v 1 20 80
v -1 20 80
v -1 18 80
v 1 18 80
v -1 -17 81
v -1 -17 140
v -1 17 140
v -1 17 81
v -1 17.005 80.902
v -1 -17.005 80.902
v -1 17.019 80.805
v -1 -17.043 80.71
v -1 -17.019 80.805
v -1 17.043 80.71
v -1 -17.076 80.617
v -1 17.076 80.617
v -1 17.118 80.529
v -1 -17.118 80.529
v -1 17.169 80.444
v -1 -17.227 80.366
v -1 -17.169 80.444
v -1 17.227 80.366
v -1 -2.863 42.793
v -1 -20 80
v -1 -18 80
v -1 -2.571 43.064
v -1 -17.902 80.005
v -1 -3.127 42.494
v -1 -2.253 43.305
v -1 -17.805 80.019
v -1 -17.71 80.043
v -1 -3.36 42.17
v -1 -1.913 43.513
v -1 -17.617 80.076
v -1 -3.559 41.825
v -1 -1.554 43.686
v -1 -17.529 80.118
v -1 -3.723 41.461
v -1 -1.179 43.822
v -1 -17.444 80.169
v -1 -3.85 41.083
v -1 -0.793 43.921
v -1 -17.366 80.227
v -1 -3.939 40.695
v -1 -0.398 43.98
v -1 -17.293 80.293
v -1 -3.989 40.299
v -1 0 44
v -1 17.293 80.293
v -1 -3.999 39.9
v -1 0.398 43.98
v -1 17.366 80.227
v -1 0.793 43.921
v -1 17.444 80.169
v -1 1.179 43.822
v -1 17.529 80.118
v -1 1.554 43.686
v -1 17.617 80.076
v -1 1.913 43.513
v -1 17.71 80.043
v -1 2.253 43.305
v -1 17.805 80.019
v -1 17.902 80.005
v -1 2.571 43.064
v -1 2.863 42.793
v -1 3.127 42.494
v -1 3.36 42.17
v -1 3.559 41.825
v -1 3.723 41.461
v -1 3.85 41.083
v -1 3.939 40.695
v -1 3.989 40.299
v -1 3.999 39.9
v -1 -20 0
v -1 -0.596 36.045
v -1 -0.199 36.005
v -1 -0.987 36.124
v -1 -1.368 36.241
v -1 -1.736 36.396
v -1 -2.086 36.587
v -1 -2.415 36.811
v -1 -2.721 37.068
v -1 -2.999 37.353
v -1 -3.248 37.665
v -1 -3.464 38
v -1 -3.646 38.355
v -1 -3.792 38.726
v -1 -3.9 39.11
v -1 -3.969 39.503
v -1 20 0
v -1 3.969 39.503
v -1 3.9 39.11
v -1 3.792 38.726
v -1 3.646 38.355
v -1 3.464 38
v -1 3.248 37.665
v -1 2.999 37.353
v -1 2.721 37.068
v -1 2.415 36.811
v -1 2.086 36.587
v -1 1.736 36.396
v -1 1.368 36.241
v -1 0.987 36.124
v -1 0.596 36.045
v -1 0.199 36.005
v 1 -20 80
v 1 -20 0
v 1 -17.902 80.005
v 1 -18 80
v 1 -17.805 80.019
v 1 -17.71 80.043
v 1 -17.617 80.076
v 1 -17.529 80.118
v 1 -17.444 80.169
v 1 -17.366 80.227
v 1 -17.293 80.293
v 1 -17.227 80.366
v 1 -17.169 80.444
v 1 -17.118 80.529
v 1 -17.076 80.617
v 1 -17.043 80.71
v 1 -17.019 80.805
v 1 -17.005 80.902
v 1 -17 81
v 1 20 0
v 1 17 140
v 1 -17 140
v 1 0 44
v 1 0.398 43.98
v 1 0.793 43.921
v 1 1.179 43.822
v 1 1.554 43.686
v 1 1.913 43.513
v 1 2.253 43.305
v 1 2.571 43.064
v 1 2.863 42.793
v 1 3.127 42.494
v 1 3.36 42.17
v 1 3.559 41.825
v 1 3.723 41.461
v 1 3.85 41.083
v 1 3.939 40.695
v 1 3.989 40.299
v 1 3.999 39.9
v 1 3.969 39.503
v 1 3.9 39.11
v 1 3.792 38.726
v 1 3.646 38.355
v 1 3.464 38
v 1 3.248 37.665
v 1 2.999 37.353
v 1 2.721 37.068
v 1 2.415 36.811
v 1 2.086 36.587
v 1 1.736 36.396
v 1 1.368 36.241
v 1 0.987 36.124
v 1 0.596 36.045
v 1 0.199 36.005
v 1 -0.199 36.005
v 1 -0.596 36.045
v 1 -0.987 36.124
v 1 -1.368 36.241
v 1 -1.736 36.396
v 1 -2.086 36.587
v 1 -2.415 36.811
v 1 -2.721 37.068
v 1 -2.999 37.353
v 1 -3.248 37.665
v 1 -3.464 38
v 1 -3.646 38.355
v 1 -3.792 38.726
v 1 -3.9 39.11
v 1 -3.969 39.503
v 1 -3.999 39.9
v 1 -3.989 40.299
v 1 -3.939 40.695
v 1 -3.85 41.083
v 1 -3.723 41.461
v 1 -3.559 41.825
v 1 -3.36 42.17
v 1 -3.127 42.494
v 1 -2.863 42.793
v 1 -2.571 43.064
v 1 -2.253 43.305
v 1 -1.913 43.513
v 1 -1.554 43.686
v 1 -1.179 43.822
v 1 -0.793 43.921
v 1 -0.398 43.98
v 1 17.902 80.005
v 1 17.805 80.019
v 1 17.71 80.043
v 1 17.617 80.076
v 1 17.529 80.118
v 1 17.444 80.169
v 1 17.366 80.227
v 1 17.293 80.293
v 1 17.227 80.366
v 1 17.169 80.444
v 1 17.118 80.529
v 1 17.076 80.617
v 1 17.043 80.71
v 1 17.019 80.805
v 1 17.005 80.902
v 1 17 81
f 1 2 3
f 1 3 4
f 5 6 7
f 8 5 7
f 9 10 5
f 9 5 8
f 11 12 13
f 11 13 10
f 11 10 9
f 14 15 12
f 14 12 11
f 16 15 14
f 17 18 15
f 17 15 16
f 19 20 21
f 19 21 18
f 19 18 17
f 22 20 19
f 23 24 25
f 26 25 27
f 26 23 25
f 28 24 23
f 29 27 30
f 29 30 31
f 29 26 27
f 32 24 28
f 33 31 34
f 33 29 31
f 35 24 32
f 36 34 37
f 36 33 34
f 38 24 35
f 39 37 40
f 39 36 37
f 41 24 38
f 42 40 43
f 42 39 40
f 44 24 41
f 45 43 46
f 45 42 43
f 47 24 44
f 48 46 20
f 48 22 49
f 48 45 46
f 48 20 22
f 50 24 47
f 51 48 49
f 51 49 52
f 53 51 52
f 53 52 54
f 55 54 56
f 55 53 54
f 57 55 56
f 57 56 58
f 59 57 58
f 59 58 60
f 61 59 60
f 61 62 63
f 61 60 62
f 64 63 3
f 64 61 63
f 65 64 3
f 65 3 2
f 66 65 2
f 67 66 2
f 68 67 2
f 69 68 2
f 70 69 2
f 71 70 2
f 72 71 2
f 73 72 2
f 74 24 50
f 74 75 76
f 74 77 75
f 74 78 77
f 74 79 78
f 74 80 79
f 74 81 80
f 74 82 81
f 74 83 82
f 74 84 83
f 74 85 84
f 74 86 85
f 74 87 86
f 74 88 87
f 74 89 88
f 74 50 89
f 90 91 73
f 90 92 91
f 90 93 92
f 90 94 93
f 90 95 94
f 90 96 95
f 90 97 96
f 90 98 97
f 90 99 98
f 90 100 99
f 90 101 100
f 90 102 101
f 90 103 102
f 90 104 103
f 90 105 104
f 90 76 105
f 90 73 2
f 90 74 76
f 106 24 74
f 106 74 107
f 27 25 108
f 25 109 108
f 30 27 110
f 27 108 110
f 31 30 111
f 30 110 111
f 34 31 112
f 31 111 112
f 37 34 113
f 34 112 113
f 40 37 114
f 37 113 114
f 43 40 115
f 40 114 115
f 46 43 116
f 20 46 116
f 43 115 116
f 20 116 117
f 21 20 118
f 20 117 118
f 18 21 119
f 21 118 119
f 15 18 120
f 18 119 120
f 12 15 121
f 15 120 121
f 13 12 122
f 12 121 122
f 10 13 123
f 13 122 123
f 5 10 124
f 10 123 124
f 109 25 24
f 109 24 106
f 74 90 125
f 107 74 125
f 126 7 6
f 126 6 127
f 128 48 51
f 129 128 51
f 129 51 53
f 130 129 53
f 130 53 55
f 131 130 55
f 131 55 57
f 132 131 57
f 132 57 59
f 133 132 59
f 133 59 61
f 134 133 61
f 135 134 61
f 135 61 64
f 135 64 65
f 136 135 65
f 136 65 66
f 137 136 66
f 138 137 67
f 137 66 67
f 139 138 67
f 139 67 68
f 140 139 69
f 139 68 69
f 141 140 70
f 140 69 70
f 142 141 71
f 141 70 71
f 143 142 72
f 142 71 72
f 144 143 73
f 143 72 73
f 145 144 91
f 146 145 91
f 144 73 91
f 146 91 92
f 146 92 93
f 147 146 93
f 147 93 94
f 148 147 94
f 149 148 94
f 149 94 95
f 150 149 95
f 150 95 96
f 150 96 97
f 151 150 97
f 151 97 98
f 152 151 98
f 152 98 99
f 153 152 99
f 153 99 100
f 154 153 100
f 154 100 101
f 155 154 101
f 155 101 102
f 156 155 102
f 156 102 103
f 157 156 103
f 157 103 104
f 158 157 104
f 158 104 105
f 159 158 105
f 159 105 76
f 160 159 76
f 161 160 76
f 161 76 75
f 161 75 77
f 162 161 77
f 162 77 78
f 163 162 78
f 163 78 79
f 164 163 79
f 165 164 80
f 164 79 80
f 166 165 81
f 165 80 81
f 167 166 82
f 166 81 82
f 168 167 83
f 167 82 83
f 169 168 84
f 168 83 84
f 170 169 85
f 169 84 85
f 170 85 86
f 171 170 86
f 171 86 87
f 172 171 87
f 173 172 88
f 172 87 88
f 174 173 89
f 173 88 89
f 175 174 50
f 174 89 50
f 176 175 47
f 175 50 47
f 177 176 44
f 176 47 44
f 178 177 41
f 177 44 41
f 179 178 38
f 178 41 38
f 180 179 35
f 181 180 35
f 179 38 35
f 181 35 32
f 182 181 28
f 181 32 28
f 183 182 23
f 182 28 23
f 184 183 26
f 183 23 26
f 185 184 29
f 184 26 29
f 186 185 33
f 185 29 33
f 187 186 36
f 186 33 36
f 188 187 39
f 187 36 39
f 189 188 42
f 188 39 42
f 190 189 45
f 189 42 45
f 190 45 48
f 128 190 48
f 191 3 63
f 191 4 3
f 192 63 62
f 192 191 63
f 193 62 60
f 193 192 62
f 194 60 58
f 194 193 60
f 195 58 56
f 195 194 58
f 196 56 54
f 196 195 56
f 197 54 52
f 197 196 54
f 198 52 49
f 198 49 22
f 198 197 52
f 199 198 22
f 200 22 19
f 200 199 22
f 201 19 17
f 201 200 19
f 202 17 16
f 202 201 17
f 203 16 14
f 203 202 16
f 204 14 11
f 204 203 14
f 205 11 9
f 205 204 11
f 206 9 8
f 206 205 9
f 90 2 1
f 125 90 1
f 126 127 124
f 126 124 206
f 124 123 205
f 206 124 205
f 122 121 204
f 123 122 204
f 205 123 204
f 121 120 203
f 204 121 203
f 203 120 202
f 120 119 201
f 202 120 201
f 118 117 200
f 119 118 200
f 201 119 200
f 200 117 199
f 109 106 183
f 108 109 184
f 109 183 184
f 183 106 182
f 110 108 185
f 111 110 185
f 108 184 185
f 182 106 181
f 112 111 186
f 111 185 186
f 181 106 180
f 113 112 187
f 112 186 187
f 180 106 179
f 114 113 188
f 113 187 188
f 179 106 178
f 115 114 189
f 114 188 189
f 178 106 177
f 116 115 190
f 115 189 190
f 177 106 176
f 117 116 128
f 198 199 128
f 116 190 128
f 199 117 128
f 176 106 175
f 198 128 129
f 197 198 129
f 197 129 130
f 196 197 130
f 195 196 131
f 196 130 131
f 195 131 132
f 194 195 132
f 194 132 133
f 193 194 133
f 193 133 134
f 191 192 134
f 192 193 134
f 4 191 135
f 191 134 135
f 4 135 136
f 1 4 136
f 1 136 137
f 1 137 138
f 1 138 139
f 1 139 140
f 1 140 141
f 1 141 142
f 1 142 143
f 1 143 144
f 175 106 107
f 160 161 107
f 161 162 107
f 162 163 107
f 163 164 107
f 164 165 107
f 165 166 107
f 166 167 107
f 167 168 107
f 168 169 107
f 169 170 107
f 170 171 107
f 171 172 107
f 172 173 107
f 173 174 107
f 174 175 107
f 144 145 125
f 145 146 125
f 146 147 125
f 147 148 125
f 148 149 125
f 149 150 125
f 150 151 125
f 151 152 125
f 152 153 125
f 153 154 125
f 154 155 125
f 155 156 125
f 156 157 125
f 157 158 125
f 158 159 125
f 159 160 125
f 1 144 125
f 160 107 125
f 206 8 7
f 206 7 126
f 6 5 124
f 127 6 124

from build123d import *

# Parameters (mm, degrees)
SKETCH1_W           = 2
SKETCH1_H           = 40
BOSS_EXTRUDE1_DEPTH = 80
SKETCH2_W           = 2
SKETCH2_H           = 34
BOSS_EXTRUDE2_DEPTH = 60
FILLET1_R           = 1
SKETCH3_R           = 2
CUT_EXTRUDE1_DEPTH  = 142.435497666
SKETCH4_R           = 4
CUT_EXTRUDE2_DEPTH  = 142.435497666


with BuildPart() as part:
    # Sketch1 → Boss-Extrude1 (new body)
    with BuildSketch(Plane.XY):
        Rectangle(SKETCH1_W, SKETCH1_H)
    extrude(amount=BOSS_EXTRUDE1_DEPTH)

    # Sketch2 → Boss-Extrude2 (add)
    with BuildSketch(Plane.XY.offset(80)):
        Rectangle(SKETCH2_W, SKETCH2_H)
    extrude(amount=BOSS_EXTRUDE2_DEPTH)

    # Fillet1
    fillet1_edges = [part.edges().sort_by_distance(p)[0] for p in [
        (0, 17, 80),
        (0, -17, 80),
    ]]
    fillet(fillet1_edges, radius=FILLET1_R)

    # Sketch3 → Cut-Extrude1 (cut, through all)
    with BuildSketch(Plane.ZY.offset(1)):
        with Locations((40, 0)):
            Circle(SKETCH3_R)
    extrude(amount=-CUT_EXTRUDE1_DEPTH, mode=Mode.SUBTRACT)

    # Sketch4 → Cut-Extrude2 (cut, through all)
    with BuildSketch(Plane.ZY.offset(1)):
        with Locations((40, 0)):
            Circle(SKETCH4_R)
    extrude(amount=-CUT_EXTRUDE2_DEPTH, mode=Mode.SUBTRACT)


solid = part.part
